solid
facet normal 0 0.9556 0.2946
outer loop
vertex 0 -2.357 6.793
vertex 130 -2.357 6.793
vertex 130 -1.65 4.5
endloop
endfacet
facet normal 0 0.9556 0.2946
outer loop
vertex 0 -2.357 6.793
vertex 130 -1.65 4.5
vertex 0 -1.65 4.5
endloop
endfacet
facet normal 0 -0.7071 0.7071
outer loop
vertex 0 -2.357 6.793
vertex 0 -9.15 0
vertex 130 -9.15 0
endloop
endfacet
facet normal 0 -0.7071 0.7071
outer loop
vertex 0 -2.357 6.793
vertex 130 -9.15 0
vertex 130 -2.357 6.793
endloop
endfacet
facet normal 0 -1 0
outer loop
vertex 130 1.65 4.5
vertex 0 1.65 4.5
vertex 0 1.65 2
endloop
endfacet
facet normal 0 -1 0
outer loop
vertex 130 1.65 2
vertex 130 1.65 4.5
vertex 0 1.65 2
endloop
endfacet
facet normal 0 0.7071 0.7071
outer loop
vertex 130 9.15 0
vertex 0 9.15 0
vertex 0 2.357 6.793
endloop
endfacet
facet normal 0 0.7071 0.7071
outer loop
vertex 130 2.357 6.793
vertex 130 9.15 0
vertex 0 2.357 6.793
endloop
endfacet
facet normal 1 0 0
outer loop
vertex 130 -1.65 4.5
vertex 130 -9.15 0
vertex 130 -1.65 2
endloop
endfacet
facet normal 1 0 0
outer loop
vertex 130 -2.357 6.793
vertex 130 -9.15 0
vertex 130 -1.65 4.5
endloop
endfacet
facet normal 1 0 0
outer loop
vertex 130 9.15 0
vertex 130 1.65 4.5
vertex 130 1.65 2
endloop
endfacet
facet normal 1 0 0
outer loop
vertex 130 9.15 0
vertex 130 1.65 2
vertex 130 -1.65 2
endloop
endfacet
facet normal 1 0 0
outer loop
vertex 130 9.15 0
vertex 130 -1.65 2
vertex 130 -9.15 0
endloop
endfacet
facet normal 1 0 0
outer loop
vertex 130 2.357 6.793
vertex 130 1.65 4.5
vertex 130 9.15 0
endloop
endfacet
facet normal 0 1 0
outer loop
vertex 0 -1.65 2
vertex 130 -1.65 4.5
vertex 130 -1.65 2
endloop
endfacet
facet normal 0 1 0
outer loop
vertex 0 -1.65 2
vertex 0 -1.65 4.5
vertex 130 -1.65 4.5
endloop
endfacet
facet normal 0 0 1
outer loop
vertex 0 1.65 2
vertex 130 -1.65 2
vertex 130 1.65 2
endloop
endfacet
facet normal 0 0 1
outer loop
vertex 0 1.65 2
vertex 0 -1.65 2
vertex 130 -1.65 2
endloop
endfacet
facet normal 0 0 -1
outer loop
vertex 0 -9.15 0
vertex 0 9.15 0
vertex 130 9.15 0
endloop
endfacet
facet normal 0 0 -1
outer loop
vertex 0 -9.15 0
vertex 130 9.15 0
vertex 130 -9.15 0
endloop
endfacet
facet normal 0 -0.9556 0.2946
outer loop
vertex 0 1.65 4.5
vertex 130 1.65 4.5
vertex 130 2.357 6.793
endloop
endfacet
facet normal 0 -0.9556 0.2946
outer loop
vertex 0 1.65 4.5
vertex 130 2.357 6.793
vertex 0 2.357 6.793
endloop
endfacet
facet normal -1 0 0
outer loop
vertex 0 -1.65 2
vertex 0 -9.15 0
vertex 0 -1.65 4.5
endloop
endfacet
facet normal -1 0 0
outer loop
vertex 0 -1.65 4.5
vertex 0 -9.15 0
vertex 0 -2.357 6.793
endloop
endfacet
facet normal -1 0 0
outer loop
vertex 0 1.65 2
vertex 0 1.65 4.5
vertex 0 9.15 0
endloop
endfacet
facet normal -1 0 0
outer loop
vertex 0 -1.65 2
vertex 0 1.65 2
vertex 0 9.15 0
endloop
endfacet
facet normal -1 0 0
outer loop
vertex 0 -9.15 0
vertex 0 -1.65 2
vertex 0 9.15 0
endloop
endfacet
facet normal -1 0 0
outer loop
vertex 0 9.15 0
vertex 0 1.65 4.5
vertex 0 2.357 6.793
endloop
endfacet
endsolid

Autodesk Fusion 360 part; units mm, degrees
sketch "Esquisse1" plane through (0, 0, 0) normal (1, 0, 0) x (0, 1, 0)
  line L0 (0, 0) -> (9.15, 0)
  line L1 (9.15, 0) -> (1.65, 7.5)
  line L2 (1.65, 7.5) -> (1.65, 2)
  line L3 (1.65, 2) -> (0, 2)
  line L4 (0, 2.5) -> (0, 20)
  line L5 (-1.65, 2) -> (0, 2)
  line L6 (0, 0) -> (-9.15, 0)
  line L7 (-1.65, 7.5) -> (-1.65, 2)
  line L8 (-9.15, 0) -> (-1.65, 7.5)
  dimension "d2" = 45
  dimension "d3" = 5.5
  dimension "d5" = 2
  dimension "d6" = 3.3
extrude "Extrusion1" add sketch "Esquisse1" along normal blind 130
chamfer "Chanfrein1" distance 3 distance2 1 1 edges at (65, -1.65, 7.5) measured on face at (43.3333, -1.65, 5.6667)
chamfer "Chanfrein2" distance 1 distance2 3 1 edges at (65, 1.65, 7.5) measured on face at (43.3333, 6.65, 2.5)
component "Component" placed x (1, 0, 0) y (0, 1, 0) z (0, 0, 1) at (0, 0, 0)
